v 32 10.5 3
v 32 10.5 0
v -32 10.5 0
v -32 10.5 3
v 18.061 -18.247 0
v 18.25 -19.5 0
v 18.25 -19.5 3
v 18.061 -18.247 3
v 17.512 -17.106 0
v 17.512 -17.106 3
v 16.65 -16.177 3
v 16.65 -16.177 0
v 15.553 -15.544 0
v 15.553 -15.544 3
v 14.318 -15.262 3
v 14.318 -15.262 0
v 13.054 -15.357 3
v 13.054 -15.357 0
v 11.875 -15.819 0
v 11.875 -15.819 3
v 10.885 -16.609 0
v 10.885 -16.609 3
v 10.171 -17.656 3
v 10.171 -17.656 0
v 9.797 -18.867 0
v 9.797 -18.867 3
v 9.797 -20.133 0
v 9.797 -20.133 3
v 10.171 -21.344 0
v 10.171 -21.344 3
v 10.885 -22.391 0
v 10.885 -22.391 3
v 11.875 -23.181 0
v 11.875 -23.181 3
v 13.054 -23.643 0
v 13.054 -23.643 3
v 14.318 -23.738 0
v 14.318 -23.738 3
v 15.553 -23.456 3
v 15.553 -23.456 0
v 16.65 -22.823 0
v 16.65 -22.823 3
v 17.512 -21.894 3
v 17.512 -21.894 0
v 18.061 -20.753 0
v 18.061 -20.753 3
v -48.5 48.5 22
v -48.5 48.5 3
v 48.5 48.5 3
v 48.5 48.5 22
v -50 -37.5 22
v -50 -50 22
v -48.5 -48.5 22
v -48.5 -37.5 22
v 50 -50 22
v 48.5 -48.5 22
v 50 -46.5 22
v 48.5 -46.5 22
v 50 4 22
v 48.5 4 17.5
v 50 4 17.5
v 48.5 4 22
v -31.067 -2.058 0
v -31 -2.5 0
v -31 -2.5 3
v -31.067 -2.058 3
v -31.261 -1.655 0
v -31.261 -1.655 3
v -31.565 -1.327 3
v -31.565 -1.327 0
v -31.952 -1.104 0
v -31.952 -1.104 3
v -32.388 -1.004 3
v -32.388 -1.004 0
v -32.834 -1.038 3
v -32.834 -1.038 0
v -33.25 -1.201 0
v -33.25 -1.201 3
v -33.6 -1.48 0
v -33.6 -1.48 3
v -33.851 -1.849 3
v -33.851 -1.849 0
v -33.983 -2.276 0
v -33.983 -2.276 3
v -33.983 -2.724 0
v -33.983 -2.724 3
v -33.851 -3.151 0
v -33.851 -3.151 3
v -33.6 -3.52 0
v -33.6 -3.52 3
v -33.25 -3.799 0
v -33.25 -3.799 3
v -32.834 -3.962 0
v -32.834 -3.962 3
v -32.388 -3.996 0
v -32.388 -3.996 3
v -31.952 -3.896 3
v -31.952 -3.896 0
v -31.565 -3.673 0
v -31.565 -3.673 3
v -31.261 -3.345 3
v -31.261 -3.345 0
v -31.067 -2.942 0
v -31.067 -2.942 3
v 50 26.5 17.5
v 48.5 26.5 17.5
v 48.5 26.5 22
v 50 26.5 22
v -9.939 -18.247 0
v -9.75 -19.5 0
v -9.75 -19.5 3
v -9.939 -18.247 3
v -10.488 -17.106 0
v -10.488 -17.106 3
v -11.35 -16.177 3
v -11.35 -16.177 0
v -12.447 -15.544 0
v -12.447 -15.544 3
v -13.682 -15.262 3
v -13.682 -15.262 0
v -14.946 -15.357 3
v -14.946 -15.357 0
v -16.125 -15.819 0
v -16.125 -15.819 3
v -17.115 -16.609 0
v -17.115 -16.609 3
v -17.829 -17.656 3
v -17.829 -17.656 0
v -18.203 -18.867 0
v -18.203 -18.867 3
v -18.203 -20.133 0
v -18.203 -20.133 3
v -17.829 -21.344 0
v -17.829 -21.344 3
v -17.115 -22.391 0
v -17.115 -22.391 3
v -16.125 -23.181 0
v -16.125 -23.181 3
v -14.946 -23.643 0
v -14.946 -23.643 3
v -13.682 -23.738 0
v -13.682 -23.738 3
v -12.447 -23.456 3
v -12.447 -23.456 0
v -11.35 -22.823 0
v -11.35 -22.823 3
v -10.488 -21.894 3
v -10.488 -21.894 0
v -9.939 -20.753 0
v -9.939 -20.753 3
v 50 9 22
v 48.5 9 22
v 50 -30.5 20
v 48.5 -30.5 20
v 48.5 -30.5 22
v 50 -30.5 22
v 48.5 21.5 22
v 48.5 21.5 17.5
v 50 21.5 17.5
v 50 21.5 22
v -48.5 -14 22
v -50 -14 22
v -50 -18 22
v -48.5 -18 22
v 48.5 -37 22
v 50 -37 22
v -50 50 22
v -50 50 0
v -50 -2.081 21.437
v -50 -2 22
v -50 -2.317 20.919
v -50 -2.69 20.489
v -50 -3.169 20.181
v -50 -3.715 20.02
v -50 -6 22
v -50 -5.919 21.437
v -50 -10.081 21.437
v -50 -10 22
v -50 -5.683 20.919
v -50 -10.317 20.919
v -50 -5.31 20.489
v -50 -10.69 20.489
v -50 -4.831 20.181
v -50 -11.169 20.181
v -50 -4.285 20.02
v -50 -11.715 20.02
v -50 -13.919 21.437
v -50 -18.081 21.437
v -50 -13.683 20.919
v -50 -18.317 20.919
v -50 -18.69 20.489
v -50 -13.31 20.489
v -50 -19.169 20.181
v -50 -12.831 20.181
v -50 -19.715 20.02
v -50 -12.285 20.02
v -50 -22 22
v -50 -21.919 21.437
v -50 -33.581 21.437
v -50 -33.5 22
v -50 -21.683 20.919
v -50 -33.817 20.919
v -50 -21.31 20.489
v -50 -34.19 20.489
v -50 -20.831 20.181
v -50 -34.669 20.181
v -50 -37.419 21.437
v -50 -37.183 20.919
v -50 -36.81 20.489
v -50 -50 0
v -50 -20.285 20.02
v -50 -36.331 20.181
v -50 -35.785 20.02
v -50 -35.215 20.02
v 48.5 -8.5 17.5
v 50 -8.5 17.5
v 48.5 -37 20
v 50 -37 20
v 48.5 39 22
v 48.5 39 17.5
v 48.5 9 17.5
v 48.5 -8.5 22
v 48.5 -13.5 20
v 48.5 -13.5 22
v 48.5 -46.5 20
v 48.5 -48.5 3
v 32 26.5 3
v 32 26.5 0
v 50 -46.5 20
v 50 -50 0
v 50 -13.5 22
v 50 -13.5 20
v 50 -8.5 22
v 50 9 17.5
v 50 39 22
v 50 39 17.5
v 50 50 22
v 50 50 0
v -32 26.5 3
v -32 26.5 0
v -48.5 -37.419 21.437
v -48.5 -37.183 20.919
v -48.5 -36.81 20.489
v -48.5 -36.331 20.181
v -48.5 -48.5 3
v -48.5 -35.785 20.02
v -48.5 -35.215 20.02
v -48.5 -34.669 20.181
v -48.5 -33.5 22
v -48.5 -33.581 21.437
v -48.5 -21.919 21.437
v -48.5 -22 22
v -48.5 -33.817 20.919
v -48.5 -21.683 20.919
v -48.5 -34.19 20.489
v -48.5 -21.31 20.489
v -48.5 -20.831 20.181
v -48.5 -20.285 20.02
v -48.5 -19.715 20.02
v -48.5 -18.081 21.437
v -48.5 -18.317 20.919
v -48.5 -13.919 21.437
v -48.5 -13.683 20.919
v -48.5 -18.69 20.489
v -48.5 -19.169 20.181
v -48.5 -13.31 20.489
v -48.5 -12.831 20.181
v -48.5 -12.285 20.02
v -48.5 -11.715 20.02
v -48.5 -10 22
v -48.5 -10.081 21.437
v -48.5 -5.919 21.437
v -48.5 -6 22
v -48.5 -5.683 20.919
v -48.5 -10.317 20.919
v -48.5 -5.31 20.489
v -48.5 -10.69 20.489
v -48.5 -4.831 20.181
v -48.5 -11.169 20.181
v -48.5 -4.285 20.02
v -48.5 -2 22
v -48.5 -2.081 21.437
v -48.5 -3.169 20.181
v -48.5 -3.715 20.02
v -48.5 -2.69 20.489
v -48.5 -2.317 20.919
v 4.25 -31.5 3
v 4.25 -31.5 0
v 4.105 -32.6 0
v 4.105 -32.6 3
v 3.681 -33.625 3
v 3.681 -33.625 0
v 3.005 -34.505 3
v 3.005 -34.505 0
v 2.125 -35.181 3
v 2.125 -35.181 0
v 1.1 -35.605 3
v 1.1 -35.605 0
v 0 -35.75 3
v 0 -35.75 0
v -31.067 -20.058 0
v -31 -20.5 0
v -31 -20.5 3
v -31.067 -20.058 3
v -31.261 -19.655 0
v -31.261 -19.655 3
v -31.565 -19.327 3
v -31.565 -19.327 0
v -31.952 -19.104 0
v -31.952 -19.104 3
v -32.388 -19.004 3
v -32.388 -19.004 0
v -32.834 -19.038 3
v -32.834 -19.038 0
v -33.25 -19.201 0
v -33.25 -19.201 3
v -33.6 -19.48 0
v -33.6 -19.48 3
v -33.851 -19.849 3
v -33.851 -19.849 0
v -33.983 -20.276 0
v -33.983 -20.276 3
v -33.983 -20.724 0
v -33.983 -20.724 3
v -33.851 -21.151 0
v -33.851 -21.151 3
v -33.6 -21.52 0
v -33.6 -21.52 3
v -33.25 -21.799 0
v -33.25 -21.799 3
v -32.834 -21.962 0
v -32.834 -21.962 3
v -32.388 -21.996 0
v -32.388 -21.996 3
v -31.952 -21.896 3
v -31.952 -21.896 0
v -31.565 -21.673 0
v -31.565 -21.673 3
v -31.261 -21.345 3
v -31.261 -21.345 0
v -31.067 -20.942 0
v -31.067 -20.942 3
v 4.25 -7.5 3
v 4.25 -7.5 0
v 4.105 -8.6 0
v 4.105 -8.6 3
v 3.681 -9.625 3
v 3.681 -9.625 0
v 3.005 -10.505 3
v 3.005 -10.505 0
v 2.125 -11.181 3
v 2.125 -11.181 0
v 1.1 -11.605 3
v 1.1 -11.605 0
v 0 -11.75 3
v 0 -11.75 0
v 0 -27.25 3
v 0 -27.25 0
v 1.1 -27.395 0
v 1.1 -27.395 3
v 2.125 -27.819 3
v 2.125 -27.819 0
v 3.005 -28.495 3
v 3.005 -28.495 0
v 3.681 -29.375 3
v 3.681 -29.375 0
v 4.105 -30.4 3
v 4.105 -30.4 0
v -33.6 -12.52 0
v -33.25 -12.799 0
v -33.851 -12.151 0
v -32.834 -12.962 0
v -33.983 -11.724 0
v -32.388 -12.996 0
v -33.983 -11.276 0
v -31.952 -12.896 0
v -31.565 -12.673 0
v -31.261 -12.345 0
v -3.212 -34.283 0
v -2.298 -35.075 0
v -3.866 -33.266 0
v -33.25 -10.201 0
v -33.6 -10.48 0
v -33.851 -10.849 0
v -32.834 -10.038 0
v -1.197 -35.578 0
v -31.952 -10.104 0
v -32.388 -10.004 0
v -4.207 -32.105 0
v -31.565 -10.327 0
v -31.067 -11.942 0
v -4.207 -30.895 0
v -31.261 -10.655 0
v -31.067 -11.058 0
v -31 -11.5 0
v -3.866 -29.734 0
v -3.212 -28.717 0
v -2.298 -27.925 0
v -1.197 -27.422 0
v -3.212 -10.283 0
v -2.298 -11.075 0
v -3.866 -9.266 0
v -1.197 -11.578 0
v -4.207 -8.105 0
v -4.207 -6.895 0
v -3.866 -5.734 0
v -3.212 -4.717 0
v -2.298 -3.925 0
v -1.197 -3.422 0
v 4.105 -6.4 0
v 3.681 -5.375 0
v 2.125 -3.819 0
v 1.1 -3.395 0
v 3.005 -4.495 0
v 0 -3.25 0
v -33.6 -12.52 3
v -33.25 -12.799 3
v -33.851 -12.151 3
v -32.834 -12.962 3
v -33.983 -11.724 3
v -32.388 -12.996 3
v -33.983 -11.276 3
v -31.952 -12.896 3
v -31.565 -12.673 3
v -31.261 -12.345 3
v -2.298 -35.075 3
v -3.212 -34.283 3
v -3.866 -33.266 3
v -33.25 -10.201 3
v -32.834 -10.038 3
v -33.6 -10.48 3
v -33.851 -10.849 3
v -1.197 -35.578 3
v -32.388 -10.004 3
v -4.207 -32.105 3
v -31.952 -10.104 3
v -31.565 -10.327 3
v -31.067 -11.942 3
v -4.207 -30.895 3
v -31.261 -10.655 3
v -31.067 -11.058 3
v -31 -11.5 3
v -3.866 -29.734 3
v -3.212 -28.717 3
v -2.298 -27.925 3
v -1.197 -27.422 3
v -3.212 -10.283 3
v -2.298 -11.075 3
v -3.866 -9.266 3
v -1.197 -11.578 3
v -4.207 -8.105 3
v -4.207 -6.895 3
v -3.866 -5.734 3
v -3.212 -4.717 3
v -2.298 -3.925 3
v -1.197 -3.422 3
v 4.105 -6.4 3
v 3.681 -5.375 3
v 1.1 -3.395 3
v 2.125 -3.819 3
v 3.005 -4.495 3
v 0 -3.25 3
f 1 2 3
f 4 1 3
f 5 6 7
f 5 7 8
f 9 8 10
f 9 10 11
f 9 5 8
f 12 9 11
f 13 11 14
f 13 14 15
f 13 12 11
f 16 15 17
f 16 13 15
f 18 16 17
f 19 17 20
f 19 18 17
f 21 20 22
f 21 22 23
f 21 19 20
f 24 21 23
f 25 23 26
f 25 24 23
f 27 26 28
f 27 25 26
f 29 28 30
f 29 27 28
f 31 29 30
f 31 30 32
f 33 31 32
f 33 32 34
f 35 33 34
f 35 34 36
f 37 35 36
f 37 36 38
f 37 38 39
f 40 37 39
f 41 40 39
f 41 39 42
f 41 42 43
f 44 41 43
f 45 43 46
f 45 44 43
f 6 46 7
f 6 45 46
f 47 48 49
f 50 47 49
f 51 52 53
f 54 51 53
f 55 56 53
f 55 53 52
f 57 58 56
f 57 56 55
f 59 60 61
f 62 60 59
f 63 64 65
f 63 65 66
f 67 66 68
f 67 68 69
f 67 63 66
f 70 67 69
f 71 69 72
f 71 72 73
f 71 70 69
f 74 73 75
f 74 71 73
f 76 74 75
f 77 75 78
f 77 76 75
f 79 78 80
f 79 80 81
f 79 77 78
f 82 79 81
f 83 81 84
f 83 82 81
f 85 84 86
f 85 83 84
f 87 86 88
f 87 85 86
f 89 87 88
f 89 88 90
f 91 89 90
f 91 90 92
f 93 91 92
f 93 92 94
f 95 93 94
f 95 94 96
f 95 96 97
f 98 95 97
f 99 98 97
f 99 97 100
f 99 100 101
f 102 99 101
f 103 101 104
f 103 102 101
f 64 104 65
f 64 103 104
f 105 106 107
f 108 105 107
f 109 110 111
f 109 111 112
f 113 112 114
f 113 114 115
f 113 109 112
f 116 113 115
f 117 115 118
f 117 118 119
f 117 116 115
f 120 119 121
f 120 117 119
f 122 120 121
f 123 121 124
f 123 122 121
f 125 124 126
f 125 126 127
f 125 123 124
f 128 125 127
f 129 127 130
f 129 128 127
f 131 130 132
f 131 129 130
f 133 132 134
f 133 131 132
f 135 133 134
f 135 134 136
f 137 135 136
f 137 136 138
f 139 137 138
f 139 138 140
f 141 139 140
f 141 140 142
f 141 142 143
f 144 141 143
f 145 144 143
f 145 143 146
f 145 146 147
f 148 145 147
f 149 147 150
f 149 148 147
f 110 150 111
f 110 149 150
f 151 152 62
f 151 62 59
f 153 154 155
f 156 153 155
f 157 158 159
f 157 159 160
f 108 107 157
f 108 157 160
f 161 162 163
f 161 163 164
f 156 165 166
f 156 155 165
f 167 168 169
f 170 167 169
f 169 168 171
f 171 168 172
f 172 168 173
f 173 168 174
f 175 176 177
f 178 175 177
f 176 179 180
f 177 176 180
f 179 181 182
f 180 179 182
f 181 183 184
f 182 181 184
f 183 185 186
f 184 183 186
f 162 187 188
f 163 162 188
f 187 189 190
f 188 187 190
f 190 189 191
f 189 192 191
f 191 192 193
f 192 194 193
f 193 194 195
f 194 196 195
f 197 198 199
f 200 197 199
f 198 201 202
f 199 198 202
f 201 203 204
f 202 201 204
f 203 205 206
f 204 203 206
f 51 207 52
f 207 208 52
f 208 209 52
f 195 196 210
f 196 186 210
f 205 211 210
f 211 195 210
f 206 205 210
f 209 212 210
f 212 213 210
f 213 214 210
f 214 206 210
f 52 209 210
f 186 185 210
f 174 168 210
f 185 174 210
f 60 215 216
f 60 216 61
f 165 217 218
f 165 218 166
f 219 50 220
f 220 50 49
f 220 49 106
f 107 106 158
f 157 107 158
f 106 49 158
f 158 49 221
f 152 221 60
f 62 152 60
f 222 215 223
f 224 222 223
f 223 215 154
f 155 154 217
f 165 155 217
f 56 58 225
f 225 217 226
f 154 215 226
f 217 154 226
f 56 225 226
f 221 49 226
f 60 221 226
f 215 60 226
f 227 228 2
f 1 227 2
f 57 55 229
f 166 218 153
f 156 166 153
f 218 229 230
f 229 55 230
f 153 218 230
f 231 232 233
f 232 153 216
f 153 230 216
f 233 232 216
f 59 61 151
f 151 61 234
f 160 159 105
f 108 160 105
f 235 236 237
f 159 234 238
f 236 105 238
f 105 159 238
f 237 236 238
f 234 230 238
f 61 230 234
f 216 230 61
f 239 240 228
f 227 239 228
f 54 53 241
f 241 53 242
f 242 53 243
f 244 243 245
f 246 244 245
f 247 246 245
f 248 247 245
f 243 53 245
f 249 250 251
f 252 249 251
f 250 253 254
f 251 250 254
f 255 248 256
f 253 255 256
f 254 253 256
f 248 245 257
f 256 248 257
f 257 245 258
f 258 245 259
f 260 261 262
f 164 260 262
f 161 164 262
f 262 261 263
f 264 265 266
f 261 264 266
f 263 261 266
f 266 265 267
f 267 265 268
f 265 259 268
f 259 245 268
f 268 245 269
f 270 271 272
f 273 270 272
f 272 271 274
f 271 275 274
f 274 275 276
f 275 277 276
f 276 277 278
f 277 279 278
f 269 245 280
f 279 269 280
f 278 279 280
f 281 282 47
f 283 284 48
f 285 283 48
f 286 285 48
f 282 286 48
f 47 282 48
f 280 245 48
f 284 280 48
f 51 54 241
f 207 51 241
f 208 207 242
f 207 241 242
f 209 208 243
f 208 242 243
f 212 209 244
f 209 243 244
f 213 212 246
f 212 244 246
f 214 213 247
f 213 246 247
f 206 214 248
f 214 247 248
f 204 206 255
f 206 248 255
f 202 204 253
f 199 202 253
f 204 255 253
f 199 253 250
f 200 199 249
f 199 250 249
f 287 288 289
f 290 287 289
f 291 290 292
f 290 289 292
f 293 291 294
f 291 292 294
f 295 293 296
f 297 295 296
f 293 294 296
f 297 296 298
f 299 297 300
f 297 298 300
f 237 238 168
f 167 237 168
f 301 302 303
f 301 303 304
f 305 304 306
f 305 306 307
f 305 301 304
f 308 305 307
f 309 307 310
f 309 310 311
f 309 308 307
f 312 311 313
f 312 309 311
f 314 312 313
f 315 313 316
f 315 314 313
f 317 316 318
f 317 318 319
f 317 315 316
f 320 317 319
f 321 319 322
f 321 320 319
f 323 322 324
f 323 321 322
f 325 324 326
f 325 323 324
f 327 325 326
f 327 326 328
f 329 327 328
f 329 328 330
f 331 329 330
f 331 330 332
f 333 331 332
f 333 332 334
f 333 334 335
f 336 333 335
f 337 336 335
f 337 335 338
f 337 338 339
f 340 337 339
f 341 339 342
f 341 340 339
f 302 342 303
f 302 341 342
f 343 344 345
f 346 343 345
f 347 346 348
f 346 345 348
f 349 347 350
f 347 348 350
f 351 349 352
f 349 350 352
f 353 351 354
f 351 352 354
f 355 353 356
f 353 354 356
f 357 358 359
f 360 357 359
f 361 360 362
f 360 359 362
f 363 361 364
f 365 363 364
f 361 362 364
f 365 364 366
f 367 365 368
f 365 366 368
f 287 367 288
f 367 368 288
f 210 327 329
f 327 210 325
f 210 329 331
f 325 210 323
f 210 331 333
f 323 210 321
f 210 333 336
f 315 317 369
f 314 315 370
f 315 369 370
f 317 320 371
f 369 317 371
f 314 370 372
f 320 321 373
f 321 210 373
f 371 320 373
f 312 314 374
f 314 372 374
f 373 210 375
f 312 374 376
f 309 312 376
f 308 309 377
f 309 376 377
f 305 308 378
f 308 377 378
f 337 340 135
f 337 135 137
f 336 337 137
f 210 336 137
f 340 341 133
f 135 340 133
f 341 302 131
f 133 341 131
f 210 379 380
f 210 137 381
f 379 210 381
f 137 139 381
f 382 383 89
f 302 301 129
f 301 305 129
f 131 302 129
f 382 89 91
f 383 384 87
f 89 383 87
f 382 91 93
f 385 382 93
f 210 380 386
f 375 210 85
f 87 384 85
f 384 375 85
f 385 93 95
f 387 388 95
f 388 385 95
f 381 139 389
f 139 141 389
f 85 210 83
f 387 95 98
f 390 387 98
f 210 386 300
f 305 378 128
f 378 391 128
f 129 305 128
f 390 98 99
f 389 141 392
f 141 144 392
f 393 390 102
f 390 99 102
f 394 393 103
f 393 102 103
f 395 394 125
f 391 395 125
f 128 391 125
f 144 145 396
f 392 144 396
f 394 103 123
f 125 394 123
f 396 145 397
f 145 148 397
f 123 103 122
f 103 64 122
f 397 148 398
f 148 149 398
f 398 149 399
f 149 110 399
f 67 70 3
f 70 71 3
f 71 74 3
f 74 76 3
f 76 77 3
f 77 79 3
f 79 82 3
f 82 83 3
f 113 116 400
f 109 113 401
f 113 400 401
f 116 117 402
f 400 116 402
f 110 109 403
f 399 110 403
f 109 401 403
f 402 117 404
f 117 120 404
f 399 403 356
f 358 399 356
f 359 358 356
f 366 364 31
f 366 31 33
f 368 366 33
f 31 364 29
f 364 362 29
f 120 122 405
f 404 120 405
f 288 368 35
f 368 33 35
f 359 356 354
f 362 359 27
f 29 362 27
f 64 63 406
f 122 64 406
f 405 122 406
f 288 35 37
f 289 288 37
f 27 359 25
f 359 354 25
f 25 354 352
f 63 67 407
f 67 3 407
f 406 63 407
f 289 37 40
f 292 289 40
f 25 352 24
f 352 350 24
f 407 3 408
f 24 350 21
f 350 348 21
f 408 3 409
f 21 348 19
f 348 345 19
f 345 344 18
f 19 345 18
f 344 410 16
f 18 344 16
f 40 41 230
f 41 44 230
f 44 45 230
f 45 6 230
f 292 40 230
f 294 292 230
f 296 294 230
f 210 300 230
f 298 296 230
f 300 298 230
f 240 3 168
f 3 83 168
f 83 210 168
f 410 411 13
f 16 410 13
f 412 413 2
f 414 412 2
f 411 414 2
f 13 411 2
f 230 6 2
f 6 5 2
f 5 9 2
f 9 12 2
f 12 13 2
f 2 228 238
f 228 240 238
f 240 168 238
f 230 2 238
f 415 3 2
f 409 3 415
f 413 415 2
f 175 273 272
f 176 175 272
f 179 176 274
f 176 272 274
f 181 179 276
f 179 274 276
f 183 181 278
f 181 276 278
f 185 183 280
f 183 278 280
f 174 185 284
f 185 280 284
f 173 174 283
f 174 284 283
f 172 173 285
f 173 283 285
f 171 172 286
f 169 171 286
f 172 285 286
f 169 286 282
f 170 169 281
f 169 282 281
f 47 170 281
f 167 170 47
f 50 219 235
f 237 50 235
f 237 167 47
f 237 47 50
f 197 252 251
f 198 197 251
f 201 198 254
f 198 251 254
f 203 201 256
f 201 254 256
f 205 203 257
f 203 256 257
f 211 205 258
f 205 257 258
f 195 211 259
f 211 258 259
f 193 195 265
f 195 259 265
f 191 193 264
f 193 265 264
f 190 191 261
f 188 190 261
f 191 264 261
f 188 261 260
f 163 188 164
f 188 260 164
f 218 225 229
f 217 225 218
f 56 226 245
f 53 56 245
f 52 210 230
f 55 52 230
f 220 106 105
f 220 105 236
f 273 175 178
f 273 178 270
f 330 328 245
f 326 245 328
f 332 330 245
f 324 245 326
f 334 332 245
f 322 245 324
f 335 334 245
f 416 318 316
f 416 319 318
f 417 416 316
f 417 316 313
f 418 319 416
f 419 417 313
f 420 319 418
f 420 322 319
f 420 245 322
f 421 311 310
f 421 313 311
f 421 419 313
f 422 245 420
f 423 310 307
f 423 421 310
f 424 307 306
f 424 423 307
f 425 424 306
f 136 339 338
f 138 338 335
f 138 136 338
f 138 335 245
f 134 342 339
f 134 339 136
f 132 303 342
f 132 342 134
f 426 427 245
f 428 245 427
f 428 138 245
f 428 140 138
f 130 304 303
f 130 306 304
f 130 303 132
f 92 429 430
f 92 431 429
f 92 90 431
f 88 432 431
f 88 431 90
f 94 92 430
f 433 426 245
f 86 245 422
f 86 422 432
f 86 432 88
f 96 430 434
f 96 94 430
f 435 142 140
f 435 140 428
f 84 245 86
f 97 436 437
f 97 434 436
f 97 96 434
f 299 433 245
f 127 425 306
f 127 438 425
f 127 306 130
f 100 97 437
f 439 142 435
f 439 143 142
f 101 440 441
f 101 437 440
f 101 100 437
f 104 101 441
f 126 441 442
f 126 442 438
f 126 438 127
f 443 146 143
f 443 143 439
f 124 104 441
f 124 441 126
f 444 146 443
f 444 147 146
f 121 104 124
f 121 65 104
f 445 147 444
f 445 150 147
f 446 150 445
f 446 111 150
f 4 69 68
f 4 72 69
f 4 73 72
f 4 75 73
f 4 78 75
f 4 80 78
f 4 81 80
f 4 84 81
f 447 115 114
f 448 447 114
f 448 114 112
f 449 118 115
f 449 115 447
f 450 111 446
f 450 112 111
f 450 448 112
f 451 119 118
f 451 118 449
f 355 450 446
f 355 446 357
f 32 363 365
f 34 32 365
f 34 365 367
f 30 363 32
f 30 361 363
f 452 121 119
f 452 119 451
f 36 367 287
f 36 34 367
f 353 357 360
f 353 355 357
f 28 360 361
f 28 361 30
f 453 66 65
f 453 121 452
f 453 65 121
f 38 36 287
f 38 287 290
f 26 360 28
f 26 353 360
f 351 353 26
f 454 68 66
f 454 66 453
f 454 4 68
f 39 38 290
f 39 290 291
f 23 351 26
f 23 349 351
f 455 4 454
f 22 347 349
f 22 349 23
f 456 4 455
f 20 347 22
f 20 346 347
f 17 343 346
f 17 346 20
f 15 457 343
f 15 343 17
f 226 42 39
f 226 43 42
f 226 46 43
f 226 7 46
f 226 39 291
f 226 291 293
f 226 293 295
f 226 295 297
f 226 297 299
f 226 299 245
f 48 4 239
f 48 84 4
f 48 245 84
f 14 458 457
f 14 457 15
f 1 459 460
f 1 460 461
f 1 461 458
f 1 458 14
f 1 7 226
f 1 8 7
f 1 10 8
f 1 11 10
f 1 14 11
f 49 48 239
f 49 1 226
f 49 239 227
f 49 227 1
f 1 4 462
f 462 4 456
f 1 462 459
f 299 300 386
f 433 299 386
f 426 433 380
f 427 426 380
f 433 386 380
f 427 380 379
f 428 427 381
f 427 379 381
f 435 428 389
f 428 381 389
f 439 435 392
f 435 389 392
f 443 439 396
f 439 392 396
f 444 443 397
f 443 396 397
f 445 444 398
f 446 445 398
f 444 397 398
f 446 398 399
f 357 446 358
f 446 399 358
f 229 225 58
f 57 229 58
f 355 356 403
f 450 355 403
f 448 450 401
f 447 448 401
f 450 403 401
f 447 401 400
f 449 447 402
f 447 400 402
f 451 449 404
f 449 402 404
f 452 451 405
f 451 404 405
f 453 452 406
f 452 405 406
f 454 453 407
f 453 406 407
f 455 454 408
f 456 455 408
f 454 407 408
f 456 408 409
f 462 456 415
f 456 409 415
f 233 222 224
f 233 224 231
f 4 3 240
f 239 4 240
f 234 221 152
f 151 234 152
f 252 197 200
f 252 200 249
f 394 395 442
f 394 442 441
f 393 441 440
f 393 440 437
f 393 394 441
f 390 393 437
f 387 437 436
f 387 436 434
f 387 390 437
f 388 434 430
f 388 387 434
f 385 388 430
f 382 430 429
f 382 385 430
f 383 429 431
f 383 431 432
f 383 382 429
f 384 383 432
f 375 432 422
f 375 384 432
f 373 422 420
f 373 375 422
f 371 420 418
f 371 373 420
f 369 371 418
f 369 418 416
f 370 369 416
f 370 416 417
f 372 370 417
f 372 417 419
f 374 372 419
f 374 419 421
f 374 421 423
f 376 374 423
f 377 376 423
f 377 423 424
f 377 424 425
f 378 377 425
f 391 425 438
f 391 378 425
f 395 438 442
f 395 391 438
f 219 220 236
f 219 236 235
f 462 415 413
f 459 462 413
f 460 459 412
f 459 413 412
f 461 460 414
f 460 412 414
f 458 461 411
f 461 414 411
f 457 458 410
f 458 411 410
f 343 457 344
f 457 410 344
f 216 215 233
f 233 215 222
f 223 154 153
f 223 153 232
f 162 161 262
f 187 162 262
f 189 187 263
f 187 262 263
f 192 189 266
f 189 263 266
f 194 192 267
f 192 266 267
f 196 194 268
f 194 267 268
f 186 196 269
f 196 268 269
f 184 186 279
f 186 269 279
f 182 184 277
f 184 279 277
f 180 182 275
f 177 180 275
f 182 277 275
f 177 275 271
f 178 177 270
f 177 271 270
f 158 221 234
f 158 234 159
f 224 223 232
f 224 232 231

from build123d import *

# Parameters (mm, degrees)
F0_R      = 1.5
F0_R_2    = 4.25
F1_DEPTH  = 3
F2_DEPTH  = 22
F3_W      = 9.5
F3_H      = 11
F2_FACE_W = 100
F2_FACE_H = 22
F4_DEPTH  = 50.001
F5_W      = 17
F5_H      = 3.3289747284
F6_DEPTH  = 76.9
F7_W      = 12.5
F7_H      = 8.2103219628
F7_H_2    = 8.3398447186
F7_H_3    = 8.5524427253
F8_DEPTH  = 63.2
F9_R      = 2
F10_DEPTH = 67.3


# Not quite as in the source:
# - a feature of the source that left no trace in its solid (it failed there, or was rolled back) is left out


with BuildPart() as f1:
    # F0 (on Top) → F1 (new body)
    with BuildSketch(Plane.XY):
        with BuildLine():
            Line((-48.5, -48.5), (0, -48.5))
            Line((0, -48.5), (0, -35.75))
            ThreePointArc((0, -35.75), (-4.25, -31.5), (0, -27.25))
            Line((0, -27.25), (0, -11.75))
            ThreePointArc((0, -11.75), (-4.25, -7.5), (0, -3.25))
            Line((0, -3.25), (0, 10.5))
            Line((0, 10.5), (-32, 10.5))
            Line((-32, 10.5), (-32, 26.5))
            Line((-32, 26.5), (0, 26.5))
            Line((0, 26.5), (0, 48.5))
            Line((0, 48.5), (-48.5, 48.5))
            Line((-48.5, 48.5), (-48.5, -48.5))
        make_face()
        with Locations((-32.5, -20.5)):
            Circle(F0_R, mode=Mode.SUBTRACT)
        with Locations((-32.5, -11.5)):
            Circle(F0_R, mode=Mode.SUBTRACT)
        with Locations((-32.5, -2.5)):
            Circle(F0_R, mode=Mode.SUBTRACT)
        with Locations((-14, -19.5)):
            Circle(F0_R_2, mode=Mode.SUBTRACT)
        with BuildLine():
            Line((0, -35.75), (0, -48.5))
            Line((0, -48.5), (48.5, -48.5))
            Line((48.5, -48.5), (48.5, 48.5))
            Line((48.5, 48.5), (0, 48.5))
            Line((0, 48.5), (0, 26.5))
            Line((0, 26.5), (32, 26.5))
            Line((32, 26.5), (32, 10.5))
            Line((32, 10.5), (0, 10.5))
            Line((0, 10.5), (0, -3.25))
            ThreePointArc((0, -3.25), (3.00520382, -4.49479618), (4.25, -7.5))
            ThreePointArc((4.25, -7.5), (3.00520382, -10.50520382), (0, -11.75))
            Line((0, -11.75), (0, -27.25))
            ThreePointArc((0, -27.25), (3.00520382, -28.49479618), (4.25, -31.5))
            ThreePointArc((4.25, -31.5), (3.00520382, -34.50520382), (0, -35.75))
        make_face()
        with Locations((14, -19.5)):
            Circle(F0_R_2, mode=Mode.SUBTRACT)
    extrude(amount=F1_DEPTH)

    # F0 (on Top) → F2 (join)
    with BuildSketch(Plane.XY):
        Polygon((50, 50), (-50, 50), (-50, -50), (0, -50), (50, -50), align=None)
        Polygon((48.5, -48.5), (0, -48.5), (-48.5, -48.5), (-48.5, 48.5), (0, 48.5), (48.5, 48.5), align=None, mode=Mode.SUBTRACT)
    extrude(amount=F2_DEPTH)

    # F3 (on Right) + F2_face (on face) → F4 (cut, through all)
    with BuildSketch(Plane.YZ):
        with Locations((-41.75, 25.5)):
            Rectangle(F3_W, F3_H)
    with BuildSketch(Plane(origin=(50, 0, 11), x_dir=(0, 1, 0), z_dir=(1, 0, 0))):
        Rectangle(F2_FACE_W, F2_FACE_H)
    extrude(amount=F4_DEPTH, mode=Mode.SUBTRACT)

    # F5 (on Right) → F6 (cut)
    with BuildSketch(Plane.YZ):
        with Locations((-22, 21.6644873642)):
            Rectangle(F5_W, F5_H)
    extrude(amount=F6_DEPTH, mode=Mode.SUBTRACT)

    # F7 (on Right) → F8 (cut)
    with BuildSketch(Plane.YZ):
        with Locations((32.75, 21.6051609814)):
            Rectangle(F7_W, F7_H)
        with Locations((15.25, 21.6699223593)):
            Rectangle(F7_W, F7_H_2)
        with Locations((-2.25, 21.7762213627)):
            Rectangle(F7_W, F7_H_3)
    extrude(amount=F8_DEPTH, mode=Mode.SUBTRACT)

    # F9 (on Right) → F10 (cut)
    with BuildSketch(Plane.YZ):
        with Locations((-12, 22)):
            Circle(F9_R)
        with Locations((-4, 22)):
            Circle(F9_R)
        with Locations((-20, 22)):
            Circle(F9_R)
        with Locations((-35.5, 22)):
            Circle(F9_R)
    extrude(amount=-F10_DEPTH, mode=Mode.SUBTRACT)


solid = f1.part
